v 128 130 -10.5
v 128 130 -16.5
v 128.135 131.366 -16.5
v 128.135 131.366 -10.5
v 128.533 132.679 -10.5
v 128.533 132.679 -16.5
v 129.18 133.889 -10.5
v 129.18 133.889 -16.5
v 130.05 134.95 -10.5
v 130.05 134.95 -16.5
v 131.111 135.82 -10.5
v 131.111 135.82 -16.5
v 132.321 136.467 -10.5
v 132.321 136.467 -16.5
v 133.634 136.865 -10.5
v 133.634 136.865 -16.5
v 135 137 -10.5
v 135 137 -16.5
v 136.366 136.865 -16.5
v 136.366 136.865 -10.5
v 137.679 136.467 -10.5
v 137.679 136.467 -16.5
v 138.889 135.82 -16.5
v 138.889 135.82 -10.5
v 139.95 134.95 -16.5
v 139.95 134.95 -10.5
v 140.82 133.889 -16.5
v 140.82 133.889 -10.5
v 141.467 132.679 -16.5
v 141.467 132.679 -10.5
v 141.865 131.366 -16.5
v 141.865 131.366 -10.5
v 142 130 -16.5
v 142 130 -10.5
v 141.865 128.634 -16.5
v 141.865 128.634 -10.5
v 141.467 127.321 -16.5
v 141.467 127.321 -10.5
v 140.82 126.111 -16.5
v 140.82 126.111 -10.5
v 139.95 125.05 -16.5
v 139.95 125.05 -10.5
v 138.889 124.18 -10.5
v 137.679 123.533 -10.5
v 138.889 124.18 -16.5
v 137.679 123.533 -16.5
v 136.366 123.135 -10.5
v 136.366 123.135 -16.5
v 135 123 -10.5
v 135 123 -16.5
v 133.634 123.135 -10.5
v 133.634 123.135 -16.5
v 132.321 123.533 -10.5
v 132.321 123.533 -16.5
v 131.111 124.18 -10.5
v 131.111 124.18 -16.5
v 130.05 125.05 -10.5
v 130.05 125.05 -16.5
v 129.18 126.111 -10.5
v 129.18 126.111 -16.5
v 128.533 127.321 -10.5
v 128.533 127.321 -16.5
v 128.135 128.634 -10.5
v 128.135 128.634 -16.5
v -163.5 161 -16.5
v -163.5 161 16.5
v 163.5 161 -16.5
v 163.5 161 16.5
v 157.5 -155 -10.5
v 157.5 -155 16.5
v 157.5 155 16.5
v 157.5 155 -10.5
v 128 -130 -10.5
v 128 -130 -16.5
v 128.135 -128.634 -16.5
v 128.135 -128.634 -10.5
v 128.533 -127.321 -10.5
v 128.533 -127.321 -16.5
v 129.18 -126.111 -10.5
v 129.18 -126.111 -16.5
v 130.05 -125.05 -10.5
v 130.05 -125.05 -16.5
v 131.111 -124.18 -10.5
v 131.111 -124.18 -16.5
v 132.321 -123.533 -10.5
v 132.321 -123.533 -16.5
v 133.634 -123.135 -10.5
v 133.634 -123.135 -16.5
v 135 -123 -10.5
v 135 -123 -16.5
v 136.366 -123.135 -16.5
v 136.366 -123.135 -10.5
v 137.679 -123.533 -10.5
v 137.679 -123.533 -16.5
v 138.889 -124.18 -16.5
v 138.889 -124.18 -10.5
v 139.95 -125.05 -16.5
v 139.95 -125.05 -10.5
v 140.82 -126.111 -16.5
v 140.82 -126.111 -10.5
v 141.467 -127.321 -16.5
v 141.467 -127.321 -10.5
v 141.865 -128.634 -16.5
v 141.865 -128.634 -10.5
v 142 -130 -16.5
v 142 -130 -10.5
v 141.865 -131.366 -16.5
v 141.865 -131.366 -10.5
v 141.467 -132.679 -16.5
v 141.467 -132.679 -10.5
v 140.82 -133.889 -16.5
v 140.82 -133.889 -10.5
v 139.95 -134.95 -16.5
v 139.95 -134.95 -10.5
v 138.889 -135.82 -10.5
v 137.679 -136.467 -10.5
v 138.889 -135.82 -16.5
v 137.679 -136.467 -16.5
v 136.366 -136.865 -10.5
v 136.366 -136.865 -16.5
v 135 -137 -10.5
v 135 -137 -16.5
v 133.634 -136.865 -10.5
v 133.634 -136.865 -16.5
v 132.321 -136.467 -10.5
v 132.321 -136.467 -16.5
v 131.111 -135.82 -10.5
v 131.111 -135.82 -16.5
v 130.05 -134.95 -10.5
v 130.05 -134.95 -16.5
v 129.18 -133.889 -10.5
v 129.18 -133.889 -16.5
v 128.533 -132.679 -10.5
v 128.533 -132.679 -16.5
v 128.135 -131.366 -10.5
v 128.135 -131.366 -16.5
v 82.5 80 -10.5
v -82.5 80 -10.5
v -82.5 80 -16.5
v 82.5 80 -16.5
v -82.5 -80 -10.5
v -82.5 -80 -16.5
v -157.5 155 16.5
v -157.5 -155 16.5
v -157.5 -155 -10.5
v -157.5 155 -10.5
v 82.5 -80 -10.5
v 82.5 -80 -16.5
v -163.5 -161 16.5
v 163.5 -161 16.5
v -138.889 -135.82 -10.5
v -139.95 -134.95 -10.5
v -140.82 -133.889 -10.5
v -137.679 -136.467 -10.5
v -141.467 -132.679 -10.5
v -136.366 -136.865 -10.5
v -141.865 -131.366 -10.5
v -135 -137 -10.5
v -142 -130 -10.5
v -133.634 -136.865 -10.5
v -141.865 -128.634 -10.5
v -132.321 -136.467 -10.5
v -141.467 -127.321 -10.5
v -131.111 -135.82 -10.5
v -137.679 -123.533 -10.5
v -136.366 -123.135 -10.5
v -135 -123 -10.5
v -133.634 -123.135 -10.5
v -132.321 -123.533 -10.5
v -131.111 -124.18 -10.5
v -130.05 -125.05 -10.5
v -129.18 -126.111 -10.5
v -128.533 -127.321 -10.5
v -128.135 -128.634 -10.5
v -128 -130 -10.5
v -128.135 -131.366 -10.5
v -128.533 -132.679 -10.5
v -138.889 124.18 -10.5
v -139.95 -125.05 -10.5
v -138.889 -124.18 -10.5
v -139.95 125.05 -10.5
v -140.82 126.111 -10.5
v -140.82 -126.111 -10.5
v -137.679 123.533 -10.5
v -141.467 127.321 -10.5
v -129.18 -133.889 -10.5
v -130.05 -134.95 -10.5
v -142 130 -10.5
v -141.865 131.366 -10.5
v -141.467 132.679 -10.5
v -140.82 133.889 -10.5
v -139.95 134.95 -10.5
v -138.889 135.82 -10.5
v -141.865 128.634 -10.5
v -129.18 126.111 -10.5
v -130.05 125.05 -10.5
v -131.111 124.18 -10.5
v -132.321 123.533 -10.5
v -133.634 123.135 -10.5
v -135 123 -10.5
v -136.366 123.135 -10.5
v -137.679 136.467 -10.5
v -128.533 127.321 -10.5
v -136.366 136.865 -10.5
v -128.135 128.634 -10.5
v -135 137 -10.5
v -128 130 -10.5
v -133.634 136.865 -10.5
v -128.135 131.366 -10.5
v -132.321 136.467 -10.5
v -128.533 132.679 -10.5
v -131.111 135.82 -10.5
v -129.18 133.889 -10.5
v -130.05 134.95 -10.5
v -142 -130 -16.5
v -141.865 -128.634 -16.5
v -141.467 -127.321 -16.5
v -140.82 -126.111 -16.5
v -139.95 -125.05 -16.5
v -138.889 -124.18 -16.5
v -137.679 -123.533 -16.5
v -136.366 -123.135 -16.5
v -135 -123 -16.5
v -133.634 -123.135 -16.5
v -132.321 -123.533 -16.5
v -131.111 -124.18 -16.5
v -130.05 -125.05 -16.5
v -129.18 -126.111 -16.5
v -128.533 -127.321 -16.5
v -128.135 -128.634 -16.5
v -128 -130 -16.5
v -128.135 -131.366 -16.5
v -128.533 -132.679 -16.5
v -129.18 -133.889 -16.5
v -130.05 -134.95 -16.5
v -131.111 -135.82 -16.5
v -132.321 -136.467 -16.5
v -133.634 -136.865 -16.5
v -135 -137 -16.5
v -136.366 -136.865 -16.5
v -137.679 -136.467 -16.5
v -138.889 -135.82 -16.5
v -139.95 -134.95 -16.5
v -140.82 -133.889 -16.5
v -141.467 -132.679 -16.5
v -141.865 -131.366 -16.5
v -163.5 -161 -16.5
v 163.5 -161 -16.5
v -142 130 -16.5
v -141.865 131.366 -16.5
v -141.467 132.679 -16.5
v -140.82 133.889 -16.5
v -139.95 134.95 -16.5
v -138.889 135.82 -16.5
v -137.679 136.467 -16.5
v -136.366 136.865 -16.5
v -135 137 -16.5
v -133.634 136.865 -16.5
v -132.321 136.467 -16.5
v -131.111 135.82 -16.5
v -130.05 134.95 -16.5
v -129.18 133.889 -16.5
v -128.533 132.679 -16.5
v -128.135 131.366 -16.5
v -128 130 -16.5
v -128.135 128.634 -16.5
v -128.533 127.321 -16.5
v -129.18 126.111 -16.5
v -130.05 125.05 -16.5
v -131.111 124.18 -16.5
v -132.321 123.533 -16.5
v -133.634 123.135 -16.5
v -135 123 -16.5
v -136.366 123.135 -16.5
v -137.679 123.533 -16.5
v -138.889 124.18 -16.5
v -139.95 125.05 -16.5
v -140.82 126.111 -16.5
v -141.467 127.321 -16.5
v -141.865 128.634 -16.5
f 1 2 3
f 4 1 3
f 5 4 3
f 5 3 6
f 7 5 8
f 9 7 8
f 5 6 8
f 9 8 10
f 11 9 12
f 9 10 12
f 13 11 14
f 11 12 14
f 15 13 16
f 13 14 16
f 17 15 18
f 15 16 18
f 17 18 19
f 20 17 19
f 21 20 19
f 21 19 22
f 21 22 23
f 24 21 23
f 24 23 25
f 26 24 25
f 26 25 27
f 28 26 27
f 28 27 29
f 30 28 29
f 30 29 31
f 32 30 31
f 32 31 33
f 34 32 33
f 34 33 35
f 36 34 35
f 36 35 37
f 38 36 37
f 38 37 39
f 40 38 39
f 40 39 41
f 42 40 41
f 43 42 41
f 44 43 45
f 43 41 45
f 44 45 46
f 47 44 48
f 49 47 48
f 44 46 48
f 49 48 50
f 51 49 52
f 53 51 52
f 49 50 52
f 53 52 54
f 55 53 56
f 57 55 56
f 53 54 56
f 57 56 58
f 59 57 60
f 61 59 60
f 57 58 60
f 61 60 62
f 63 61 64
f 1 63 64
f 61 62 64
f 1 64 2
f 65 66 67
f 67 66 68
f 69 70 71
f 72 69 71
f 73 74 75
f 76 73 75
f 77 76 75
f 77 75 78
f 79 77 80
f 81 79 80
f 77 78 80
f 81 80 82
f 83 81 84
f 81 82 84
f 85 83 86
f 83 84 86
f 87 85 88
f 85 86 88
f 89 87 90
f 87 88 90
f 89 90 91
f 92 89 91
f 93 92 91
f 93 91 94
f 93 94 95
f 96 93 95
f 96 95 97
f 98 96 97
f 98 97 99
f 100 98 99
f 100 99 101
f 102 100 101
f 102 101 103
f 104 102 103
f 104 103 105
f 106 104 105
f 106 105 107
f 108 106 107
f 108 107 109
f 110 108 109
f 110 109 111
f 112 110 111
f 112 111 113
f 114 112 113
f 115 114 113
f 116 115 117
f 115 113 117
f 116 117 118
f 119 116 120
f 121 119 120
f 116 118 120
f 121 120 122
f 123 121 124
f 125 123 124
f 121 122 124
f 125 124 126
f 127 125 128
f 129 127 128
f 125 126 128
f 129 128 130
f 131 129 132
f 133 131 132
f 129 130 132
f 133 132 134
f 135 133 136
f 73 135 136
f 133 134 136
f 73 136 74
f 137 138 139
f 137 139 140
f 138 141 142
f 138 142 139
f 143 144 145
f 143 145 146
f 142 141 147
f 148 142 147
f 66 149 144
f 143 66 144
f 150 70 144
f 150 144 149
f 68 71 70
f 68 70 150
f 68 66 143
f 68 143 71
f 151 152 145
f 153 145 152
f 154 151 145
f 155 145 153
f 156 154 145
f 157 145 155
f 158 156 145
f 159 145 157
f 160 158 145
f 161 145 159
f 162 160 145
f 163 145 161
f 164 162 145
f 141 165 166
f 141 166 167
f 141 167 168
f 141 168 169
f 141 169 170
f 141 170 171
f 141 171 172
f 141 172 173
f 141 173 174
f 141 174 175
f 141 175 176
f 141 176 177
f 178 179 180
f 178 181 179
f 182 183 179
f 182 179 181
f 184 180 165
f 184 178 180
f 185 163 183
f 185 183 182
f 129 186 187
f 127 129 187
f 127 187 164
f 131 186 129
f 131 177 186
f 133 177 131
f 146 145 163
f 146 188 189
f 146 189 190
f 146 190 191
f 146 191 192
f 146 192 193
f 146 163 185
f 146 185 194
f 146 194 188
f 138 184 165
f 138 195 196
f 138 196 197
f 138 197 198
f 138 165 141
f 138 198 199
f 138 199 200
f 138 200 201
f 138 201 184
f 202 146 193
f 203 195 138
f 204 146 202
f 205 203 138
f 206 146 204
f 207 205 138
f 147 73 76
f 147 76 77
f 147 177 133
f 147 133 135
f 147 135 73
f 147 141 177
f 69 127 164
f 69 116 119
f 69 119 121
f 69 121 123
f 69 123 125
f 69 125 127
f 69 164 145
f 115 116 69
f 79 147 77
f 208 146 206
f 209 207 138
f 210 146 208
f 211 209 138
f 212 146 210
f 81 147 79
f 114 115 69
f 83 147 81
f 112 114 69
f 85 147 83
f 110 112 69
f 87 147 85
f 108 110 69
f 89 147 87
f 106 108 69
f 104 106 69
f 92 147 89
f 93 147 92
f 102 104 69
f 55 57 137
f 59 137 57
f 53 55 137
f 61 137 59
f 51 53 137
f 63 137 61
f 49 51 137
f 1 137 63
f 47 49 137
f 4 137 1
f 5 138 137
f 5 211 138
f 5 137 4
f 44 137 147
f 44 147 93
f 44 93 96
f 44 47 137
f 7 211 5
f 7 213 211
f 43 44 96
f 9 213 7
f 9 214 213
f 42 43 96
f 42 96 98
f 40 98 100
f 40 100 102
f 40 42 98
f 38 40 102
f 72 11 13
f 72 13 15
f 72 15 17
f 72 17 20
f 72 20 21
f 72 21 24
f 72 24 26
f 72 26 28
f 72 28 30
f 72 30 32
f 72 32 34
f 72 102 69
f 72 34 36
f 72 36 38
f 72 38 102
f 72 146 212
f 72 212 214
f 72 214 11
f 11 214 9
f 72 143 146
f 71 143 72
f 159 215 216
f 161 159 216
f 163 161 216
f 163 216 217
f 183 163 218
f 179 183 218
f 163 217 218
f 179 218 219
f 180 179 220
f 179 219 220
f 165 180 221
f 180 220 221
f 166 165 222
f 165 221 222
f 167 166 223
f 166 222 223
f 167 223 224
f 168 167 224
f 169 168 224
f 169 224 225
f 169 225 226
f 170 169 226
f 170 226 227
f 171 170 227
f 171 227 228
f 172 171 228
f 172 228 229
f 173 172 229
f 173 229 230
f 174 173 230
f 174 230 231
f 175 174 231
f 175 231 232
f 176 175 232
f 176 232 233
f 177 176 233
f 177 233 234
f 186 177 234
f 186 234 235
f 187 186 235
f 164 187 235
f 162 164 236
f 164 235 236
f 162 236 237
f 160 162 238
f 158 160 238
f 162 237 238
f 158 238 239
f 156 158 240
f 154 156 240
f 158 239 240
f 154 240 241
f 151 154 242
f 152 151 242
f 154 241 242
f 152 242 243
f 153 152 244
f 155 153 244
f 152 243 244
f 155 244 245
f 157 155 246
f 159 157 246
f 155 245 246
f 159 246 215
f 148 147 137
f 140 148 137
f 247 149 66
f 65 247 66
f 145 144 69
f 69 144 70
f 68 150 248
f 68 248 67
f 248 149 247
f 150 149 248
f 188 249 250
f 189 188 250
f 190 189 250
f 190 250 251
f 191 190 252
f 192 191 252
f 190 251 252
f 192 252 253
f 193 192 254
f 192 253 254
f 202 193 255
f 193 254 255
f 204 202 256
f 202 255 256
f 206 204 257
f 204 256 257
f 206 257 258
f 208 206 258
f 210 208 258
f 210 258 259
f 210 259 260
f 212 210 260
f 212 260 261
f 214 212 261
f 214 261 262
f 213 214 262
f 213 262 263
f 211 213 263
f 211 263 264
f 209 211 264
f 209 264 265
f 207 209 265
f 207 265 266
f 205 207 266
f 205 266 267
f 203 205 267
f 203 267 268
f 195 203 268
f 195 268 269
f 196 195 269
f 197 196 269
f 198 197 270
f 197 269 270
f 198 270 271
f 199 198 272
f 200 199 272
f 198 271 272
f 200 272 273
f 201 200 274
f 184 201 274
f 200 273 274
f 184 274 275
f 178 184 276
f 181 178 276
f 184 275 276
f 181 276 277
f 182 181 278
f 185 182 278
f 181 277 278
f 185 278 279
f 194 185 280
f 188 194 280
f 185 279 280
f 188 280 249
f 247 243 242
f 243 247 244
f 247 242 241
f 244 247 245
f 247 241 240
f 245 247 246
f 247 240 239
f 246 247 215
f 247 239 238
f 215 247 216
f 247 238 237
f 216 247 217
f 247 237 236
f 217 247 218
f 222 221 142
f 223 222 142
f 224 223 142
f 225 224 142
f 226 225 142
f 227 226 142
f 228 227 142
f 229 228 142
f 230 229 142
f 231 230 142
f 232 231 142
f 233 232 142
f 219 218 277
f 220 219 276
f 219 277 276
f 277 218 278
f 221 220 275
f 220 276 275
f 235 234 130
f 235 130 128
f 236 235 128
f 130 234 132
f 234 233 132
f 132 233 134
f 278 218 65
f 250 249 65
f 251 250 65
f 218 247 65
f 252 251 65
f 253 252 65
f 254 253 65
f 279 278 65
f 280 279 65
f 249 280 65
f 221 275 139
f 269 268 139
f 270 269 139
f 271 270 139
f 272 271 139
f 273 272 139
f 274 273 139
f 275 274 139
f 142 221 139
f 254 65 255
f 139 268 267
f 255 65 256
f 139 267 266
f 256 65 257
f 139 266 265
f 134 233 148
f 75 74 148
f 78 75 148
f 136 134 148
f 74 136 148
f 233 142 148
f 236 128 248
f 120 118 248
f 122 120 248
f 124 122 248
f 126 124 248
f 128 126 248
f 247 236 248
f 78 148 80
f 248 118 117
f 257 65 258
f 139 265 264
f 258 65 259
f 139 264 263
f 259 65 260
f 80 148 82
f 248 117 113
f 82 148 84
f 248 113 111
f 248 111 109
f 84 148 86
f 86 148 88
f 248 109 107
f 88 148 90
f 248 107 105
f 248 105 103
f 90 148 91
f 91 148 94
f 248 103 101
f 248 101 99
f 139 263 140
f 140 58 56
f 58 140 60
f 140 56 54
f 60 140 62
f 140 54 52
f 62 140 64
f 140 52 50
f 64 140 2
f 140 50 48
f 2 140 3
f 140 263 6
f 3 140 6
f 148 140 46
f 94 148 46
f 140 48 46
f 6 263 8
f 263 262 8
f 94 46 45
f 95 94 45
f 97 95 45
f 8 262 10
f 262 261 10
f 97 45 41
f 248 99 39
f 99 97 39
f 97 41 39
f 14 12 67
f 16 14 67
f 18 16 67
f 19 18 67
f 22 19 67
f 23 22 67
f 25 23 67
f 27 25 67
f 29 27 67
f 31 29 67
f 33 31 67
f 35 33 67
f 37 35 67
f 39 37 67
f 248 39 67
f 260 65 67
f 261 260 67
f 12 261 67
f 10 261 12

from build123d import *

# Parameters (mm, degrees)
F0_W     = 327
F0_H     = 322
F1_DEPTH = 16.5
F2_T     = -6
F3_W     = 165
F3_H     = 160
F4_DEPTH = 16.501
F6_D     = 14


with BuildPart() as f1:
    # F0 (on Top) → F1 (new body, symmetric)
    with BuildSketch(Plane.XY):
        Rectangle(F0_W, F0_H)
    extrude(amount=F1_DEPTH, both=True)

    # F2
    f2_openings = [f1.faces().sort_by_distance(p)[0] for p in [
        (0, 0, 16.5),
    ]]
    offset(amount=F2_T, openings=f2_openings)

    # F3 (on Top) → F4 (cut, through all)
    with BuildSketch(Plane.XY):
        Rectangle(F3_W, F3_H)
    extrude(amount=-F4_DEPTH, mode=Mode.SUBTRACT)

    # F6 (through all)
    with Locations(Plane.XY.offset(-10.5)):
        with Locations((-135, 130), (135, 130), (135, -130), (-135, -130)):
            Hole(F6_D / 2)


solid = f1.part
